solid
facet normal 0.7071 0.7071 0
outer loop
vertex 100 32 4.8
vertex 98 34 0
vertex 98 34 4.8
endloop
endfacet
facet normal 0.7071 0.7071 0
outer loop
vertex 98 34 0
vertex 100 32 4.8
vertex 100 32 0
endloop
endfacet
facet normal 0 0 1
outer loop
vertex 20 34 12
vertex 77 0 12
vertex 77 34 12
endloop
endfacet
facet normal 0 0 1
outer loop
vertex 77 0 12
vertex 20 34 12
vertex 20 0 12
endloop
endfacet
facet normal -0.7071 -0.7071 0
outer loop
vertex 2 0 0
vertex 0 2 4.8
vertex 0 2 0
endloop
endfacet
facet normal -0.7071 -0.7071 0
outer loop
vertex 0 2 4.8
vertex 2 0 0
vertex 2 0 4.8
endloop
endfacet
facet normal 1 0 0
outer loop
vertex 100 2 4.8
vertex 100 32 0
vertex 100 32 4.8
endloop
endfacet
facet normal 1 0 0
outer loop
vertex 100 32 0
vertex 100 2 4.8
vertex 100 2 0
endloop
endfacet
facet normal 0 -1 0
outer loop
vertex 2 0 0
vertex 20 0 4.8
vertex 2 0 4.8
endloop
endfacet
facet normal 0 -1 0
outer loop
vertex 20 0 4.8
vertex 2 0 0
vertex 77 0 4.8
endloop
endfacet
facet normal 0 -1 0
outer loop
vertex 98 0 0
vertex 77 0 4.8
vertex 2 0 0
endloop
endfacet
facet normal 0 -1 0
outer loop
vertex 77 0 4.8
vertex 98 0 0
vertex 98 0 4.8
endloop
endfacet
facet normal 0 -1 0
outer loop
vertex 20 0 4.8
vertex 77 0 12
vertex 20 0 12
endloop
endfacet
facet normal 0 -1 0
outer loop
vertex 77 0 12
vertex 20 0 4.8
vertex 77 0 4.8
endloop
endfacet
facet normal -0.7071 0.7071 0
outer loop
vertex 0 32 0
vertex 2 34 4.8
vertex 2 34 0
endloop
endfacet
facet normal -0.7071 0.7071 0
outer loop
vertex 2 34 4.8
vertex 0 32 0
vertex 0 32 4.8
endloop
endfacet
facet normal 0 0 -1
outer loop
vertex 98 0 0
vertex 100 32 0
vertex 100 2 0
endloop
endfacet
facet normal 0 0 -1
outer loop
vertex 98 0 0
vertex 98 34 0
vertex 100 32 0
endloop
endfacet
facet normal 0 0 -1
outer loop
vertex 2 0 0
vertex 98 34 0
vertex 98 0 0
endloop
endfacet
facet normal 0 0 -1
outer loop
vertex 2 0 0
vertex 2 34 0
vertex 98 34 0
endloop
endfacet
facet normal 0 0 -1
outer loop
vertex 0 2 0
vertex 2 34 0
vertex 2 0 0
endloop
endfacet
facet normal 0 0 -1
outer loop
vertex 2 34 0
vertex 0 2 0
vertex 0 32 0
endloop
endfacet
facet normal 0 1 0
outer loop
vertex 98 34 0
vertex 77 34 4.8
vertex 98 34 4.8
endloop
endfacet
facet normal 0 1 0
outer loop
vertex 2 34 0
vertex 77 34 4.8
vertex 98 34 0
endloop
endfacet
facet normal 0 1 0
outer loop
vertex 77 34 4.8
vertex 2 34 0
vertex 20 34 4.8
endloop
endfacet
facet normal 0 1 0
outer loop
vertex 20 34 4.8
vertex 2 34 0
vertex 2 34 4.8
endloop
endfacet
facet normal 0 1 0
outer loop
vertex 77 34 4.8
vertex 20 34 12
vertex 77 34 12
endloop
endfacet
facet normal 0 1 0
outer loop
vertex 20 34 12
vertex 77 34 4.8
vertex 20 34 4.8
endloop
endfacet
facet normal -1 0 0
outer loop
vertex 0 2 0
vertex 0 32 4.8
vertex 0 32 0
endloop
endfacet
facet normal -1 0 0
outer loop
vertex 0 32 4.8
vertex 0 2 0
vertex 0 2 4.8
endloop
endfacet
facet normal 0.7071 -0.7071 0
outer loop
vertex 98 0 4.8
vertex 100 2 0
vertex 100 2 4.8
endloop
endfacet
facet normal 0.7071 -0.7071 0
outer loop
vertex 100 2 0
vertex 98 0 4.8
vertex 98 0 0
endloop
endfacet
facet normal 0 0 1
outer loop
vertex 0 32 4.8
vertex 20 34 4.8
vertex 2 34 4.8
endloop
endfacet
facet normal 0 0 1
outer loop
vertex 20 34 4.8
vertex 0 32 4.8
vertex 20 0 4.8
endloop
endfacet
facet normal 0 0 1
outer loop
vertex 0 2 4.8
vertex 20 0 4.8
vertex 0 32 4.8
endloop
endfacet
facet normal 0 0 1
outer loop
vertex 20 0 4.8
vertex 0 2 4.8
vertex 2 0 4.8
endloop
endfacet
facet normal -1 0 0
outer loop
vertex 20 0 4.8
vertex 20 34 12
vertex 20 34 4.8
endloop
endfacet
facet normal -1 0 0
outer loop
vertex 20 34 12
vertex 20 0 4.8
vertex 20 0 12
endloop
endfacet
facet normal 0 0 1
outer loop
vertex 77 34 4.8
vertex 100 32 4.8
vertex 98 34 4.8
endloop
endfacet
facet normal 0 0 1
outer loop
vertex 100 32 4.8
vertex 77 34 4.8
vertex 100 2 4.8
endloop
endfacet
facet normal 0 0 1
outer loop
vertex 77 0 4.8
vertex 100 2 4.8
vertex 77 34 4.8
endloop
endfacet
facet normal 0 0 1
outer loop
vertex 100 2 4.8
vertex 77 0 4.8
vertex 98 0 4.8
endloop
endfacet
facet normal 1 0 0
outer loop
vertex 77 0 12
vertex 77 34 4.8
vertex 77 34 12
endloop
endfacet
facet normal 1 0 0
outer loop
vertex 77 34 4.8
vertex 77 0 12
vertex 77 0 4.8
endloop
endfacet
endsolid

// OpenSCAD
$fn = 32;

// ----------------------------------------------------------------------
// Stepped bar: centerstep, 100 x 34 x 12/4.8 mm
// ----------------------------------------------------------------------

// --- parameters (mm) ---
bar_l = 100;              // bar length, X
bar_w = 34;               // bar width, Y
plate_t = 12;             // thickness of the thick zone, Z
thin_t = 4.8;             // thickness of the thin zone
corner_c = 2;             // corner chamfer of the bar
step_cut = 7.2;           // material removed from the thin zone
thick_from = 20;          // start of the thick middle zone
thick_to = 77;            // end of the thick middle zone
depth_1 = 7.2;            // depth of cut 1 from the top face
depth_2 = 7.2;            // depth of cut 2 from the top face
fit_tol = 0.1;            // declared fit tolerance (prompt contract)
free_tol = 0.3;           // declared free tolerance (prompt contract)

profile = [[2, 0], [98, 0], [100, 2], [100, 32], [98, 34], [2, 34], [0, 32], [0, 2]];  // primary outline, 8 points, counter clockwise
void_1 = [[-1, -1], [20, -1], [20, 35], [-1, 35]];  // thin left end, 4 points
void_2 = [[77, -1], [101, -1], [101, 35], [77, 35]];  // thin right end, 4 points

// --- the one profile operation ---
difference() {
  linear_extrude(height = plate_t) polygon(points = profile);
  translate([0, 0, plate_t - depth_1])
    linear_extrude(height = depth_1 + 1) polygon(points = void_1);
  translate([0, 0, plate_t - depth_2])
    linear_extrude(height = depth_2 + 1) polygon(points = void_2);
}
